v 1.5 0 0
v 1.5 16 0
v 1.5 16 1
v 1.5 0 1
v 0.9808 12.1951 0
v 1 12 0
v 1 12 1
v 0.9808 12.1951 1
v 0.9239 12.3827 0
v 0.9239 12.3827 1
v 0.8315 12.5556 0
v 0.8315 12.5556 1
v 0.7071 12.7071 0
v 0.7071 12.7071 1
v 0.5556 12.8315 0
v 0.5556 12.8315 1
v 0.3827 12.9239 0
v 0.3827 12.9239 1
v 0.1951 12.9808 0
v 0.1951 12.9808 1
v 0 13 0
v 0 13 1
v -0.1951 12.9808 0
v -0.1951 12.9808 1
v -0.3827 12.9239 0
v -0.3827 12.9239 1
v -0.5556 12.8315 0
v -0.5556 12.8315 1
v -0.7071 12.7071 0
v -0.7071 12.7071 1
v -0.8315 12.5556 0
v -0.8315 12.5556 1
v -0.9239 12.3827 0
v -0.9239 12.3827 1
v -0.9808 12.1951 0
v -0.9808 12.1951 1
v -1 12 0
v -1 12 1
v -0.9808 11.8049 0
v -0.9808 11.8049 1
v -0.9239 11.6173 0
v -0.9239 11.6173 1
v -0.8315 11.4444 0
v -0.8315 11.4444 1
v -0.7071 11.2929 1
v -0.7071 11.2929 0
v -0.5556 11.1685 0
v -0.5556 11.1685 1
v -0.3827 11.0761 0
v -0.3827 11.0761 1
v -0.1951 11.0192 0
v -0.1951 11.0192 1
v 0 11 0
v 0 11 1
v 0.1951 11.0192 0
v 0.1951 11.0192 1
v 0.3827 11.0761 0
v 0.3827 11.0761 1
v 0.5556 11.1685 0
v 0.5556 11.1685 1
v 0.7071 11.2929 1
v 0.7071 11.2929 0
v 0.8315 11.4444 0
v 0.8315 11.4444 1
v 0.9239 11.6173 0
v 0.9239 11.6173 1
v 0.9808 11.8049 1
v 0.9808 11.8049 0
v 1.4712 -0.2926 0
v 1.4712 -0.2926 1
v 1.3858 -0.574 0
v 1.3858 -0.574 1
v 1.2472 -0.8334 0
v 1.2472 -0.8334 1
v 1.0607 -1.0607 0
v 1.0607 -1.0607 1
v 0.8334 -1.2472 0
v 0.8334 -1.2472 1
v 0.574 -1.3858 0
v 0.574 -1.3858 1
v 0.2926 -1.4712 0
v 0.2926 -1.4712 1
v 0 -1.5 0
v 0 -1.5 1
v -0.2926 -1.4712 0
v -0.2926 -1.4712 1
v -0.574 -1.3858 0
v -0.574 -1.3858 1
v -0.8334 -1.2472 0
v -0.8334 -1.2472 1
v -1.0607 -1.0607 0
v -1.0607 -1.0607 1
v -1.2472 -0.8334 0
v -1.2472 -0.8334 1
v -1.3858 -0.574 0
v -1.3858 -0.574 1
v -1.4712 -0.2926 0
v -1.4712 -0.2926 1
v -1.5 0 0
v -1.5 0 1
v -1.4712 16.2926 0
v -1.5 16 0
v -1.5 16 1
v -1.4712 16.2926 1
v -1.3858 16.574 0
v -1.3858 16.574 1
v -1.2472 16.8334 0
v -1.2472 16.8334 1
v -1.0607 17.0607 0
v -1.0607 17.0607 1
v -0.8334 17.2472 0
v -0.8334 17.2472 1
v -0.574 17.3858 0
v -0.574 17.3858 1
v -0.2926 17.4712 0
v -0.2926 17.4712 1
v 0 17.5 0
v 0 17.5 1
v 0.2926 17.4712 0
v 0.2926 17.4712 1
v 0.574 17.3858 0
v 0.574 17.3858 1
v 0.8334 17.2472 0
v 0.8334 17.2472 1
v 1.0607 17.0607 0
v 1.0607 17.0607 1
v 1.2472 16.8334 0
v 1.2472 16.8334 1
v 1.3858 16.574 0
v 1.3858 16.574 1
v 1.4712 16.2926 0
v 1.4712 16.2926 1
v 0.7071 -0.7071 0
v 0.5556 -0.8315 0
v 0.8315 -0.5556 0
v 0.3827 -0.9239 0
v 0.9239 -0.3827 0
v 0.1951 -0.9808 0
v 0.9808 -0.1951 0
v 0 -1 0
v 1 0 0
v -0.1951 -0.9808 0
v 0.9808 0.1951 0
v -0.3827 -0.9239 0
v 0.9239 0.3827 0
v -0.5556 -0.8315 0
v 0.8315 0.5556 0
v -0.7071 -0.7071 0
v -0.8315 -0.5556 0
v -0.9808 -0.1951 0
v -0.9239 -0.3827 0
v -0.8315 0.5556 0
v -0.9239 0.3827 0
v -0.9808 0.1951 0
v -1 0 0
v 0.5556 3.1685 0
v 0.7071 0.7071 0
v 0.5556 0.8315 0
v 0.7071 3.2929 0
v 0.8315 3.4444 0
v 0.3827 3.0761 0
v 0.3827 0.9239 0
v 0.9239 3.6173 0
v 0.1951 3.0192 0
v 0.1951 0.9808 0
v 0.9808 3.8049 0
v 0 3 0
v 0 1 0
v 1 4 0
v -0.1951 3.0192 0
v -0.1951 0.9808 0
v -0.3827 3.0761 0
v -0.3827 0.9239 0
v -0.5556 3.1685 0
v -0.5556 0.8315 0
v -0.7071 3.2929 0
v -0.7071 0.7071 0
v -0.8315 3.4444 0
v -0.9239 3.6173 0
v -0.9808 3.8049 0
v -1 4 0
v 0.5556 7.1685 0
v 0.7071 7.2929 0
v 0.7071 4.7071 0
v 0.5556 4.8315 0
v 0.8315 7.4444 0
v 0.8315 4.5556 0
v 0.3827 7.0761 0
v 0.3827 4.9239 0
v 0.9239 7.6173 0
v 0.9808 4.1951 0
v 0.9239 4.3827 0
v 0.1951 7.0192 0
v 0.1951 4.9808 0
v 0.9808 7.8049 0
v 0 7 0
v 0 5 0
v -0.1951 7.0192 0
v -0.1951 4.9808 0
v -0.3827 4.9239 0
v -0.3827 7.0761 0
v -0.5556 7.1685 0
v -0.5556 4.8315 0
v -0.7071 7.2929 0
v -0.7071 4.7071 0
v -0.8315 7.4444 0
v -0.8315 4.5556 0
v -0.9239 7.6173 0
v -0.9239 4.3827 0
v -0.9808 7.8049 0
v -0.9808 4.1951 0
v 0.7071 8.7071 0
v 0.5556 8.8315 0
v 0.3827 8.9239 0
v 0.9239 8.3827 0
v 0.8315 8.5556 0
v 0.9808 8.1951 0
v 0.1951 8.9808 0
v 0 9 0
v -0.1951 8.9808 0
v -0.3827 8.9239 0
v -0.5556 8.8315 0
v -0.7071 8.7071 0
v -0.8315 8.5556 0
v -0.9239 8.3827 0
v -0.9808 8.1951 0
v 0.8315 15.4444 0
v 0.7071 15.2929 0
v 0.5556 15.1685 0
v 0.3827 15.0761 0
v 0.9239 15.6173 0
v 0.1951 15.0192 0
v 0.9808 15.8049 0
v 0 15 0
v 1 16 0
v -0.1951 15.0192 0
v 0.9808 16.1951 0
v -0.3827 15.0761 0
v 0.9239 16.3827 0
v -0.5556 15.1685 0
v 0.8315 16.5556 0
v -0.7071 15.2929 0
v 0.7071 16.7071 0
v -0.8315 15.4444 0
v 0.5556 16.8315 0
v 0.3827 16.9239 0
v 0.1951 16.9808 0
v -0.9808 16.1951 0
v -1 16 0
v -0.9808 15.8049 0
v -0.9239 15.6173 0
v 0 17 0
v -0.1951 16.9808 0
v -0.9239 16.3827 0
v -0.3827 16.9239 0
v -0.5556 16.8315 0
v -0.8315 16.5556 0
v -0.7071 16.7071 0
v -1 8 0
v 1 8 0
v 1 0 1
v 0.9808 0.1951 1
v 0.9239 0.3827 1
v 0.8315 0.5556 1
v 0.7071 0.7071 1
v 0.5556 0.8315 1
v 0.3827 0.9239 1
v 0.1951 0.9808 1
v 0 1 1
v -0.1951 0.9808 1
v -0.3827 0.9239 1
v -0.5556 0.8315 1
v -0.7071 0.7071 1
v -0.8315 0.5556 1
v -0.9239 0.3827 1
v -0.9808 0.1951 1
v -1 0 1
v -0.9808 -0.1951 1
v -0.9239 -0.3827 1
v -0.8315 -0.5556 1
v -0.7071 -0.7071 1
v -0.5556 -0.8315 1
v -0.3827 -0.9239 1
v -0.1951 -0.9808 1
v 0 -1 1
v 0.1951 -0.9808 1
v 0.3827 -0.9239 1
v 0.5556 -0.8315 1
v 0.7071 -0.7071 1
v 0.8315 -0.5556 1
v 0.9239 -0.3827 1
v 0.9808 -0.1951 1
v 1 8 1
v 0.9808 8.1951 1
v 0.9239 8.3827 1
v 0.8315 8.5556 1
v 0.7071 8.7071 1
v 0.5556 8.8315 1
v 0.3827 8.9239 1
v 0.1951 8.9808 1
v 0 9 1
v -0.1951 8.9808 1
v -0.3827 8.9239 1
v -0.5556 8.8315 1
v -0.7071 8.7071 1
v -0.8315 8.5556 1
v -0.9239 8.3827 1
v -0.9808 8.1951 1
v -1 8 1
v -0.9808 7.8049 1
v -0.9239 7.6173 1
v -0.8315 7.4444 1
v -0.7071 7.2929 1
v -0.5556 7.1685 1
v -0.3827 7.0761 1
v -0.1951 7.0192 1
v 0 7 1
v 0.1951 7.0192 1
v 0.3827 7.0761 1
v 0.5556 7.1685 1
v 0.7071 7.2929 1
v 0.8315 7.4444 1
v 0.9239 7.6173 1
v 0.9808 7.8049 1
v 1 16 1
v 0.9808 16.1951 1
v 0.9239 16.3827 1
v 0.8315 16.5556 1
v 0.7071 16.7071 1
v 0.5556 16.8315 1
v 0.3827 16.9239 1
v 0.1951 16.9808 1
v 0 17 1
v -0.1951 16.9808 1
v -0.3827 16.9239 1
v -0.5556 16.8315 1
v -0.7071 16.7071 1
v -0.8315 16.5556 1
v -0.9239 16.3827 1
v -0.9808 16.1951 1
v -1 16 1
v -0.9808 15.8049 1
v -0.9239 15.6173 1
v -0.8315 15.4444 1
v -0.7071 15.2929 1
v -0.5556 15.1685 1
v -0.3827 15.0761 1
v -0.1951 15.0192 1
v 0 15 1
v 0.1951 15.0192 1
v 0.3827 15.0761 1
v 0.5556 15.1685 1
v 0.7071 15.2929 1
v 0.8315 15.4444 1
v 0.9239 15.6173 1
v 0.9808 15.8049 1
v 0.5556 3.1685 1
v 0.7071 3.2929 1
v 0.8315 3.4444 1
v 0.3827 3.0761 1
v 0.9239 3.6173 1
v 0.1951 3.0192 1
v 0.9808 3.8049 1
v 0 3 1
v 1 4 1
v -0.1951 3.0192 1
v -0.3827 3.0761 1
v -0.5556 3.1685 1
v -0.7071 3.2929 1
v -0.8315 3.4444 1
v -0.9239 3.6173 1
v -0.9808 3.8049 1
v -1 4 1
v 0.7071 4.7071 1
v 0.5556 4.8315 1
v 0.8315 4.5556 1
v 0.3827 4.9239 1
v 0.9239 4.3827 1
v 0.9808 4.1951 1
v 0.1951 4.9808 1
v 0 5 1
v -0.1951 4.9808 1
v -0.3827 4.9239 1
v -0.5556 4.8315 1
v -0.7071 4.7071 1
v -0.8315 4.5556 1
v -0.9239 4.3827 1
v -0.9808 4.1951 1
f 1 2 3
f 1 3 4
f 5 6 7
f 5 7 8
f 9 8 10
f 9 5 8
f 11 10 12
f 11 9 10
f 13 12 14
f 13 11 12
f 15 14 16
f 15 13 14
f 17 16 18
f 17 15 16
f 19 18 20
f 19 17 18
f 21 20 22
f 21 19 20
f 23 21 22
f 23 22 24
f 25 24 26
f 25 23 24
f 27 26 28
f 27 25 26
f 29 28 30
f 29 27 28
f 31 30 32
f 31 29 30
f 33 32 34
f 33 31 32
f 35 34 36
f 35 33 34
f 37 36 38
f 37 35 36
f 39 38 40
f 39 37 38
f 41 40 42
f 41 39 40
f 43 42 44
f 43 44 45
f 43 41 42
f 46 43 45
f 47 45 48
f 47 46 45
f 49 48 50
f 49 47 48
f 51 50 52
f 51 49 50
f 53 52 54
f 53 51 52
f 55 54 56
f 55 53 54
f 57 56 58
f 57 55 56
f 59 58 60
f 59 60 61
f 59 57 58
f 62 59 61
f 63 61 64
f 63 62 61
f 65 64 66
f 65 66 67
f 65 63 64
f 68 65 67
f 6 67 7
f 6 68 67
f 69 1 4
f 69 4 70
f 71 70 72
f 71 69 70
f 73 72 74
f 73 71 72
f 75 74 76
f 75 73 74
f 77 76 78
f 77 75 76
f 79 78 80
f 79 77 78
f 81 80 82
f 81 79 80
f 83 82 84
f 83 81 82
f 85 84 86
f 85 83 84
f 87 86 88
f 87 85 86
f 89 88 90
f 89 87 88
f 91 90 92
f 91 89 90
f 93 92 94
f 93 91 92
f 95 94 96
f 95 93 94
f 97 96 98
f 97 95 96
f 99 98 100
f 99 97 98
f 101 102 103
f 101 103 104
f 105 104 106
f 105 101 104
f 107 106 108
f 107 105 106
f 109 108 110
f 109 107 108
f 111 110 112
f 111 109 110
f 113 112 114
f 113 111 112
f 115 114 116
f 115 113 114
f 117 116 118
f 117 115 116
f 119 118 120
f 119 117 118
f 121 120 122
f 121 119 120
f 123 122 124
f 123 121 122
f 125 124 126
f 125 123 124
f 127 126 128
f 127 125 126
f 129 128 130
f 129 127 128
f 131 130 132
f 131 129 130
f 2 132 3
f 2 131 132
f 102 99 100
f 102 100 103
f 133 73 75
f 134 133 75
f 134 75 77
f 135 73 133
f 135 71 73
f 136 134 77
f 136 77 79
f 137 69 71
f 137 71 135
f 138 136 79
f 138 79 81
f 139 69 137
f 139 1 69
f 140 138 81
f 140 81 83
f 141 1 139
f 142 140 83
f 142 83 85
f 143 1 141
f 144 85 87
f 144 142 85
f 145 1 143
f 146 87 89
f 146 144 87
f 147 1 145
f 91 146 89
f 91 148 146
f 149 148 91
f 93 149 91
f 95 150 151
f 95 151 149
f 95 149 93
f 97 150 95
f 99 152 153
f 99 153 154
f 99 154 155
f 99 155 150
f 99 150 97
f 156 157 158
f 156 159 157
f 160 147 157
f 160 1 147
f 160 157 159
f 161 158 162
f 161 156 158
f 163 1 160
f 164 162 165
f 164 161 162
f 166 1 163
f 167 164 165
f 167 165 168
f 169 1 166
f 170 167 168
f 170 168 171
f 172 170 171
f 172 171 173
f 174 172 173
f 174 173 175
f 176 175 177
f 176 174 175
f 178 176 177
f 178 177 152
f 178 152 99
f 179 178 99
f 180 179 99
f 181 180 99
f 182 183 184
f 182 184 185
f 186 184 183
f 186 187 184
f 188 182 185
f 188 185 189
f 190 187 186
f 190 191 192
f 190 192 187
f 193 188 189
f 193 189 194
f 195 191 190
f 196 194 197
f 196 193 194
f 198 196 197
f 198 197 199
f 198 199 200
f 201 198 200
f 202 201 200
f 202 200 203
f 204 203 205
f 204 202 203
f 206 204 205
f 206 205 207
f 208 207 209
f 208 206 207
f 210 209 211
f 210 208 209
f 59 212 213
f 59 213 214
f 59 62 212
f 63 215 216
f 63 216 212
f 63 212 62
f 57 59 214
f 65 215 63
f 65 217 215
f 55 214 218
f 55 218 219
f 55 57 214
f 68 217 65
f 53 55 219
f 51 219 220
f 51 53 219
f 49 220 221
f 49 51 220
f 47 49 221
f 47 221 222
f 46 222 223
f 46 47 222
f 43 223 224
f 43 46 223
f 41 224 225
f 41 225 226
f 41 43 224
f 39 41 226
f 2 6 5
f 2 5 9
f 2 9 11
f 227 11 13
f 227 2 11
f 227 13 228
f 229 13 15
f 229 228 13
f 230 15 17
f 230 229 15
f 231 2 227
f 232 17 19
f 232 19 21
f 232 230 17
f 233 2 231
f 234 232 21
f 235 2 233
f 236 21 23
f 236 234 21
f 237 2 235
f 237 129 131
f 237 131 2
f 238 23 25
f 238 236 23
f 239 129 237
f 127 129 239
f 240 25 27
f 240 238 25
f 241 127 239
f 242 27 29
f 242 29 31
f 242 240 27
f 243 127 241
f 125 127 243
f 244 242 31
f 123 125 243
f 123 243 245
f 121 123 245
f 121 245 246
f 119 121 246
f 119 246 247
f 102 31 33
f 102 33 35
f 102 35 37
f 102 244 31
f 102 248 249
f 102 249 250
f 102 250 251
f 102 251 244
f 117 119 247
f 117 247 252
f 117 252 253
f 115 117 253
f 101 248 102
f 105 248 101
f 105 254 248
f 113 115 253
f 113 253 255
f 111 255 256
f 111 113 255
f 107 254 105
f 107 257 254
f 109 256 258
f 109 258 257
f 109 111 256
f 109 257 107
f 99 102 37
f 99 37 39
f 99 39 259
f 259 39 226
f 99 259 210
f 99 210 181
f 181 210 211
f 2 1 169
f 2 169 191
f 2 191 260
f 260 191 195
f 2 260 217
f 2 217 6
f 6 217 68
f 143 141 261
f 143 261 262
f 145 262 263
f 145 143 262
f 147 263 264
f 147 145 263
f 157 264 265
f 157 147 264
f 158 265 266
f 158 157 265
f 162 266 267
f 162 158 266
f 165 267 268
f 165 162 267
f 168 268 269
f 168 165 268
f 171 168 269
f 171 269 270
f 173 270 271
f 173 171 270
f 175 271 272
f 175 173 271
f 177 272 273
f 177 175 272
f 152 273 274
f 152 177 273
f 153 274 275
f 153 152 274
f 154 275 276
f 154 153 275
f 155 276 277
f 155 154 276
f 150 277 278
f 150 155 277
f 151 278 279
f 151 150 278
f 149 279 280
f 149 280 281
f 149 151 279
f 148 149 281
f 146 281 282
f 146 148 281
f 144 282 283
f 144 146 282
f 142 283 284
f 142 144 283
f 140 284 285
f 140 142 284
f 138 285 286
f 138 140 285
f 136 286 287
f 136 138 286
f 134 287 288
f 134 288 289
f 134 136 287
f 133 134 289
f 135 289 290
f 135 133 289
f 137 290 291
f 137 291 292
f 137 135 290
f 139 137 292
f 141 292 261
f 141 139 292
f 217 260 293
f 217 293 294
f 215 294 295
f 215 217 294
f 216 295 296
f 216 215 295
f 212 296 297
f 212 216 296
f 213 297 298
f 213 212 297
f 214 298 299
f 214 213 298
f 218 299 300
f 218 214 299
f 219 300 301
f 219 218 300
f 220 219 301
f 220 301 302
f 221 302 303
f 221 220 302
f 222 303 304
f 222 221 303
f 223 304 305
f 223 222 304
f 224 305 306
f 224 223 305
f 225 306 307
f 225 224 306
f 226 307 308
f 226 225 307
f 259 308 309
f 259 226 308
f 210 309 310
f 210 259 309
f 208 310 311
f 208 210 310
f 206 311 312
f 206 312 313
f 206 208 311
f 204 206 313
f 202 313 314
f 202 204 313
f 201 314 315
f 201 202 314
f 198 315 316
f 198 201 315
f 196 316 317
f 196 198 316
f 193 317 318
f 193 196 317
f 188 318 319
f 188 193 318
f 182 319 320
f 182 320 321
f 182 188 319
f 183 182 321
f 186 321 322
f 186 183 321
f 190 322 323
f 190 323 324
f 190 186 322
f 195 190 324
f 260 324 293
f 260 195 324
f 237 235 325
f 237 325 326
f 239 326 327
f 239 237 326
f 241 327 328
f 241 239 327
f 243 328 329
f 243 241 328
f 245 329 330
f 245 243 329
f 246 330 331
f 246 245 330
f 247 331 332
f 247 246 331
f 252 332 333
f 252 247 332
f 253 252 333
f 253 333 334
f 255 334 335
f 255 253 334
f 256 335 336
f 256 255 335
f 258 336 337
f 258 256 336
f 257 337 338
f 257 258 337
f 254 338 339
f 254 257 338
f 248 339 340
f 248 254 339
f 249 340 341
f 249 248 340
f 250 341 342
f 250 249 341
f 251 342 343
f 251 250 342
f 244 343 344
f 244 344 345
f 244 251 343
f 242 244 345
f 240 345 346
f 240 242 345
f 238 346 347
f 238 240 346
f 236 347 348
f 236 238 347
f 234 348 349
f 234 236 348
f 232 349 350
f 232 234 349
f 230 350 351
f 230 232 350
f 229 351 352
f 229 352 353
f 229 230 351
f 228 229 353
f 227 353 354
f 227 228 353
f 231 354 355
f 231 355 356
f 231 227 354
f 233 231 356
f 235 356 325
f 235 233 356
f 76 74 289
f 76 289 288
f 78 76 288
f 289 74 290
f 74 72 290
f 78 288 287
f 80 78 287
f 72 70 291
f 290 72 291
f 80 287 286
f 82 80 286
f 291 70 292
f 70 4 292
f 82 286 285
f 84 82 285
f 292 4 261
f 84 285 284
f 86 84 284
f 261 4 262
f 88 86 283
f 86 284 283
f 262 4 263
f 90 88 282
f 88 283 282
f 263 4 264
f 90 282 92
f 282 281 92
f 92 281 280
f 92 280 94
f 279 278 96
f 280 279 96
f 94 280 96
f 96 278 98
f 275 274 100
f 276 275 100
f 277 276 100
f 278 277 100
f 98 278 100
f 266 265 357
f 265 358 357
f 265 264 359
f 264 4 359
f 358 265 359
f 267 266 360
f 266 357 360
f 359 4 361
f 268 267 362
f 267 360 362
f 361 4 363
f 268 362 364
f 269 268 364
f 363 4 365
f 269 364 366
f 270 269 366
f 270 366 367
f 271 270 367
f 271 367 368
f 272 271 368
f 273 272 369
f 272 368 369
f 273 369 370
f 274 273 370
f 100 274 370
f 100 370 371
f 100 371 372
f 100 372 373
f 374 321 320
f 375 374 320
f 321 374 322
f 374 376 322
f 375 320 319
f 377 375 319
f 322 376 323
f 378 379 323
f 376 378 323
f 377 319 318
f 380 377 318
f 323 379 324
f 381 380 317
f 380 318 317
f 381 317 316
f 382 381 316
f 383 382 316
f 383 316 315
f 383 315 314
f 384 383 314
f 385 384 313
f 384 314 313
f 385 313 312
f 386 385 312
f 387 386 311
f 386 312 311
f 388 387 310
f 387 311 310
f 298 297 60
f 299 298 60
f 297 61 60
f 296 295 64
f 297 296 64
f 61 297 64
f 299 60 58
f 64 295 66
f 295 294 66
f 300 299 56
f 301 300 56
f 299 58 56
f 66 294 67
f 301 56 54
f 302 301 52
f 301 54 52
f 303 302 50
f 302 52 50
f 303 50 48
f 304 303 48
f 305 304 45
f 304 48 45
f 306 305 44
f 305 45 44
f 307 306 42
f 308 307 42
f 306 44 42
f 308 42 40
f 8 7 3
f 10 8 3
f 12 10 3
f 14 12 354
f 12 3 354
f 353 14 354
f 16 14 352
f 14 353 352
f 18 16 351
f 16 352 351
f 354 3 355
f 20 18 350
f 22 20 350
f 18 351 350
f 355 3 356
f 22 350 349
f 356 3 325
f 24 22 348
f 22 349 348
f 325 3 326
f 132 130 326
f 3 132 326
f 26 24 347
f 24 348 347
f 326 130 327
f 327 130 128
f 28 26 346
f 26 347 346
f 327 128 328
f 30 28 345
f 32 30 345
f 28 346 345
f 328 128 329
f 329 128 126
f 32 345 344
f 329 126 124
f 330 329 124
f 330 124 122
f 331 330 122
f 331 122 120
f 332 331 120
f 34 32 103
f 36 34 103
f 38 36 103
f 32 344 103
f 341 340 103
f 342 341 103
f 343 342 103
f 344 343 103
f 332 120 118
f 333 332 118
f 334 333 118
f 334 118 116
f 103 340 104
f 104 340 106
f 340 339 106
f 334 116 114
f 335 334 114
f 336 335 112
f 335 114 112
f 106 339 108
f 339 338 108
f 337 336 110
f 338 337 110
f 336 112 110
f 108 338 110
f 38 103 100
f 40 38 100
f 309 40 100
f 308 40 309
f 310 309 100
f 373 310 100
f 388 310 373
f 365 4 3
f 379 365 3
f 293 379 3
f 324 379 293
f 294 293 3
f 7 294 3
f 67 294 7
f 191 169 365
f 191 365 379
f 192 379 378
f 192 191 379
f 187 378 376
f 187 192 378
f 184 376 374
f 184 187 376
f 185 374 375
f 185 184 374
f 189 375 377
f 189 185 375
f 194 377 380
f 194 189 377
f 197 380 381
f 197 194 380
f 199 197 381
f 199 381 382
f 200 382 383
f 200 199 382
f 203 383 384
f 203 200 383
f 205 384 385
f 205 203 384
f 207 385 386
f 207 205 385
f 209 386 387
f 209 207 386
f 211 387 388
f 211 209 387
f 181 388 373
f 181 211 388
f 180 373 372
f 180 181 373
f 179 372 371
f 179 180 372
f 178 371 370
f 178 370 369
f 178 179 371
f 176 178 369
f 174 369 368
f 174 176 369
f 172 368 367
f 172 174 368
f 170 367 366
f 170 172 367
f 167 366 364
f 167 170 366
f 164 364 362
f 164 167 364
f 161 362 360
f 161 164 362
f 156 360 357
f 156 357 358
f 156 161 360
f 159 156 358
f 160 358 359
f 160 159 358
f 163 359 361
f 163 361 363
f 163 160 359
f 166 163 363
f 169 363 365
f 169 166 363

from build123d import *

# Parameters (mm, degrees)
SKETCH_1_R      = 1
EXTRUDE_1_DEPTH = 1


with BuildPart() as part:
    # 草图1 → 凸台-拉伸1 (new body)
    with BuildSketch(Plane.XY):
        with BuildLine():
            Line((-1.5, 0), (-1.5, 16))
            ThreePointArc((-1.5, 16), (0, 17.5), (1.5, 16))
            Line((1.5, 16), (1.5, 0))
            ThreePointArc((1.5, 0), (0, -1.5), (-1.5, 0))
        make_face()
        with Locations((0, 16)):
            Circle(SKETCH_1_R, mode=Mode.SUBTRACT)
        with Locations((0, 8)):
            Circle(SKETCH_1_R, mode=Mode.SUBTRACT)
        with Locations((0, 12)):
            Circle(SKETCH_1_R, mode=Mode.SUBTRACT)
        Circle(SKETCH_1_R, mode=Mode.SUBTRACT)
        with Locations((0, 4)):
            Circle(SKETCH_1_R, mode=Mode.SUBTRACT)
    extrude(amount=EXTRUDE_1_DEPTH)


solid = part.part
